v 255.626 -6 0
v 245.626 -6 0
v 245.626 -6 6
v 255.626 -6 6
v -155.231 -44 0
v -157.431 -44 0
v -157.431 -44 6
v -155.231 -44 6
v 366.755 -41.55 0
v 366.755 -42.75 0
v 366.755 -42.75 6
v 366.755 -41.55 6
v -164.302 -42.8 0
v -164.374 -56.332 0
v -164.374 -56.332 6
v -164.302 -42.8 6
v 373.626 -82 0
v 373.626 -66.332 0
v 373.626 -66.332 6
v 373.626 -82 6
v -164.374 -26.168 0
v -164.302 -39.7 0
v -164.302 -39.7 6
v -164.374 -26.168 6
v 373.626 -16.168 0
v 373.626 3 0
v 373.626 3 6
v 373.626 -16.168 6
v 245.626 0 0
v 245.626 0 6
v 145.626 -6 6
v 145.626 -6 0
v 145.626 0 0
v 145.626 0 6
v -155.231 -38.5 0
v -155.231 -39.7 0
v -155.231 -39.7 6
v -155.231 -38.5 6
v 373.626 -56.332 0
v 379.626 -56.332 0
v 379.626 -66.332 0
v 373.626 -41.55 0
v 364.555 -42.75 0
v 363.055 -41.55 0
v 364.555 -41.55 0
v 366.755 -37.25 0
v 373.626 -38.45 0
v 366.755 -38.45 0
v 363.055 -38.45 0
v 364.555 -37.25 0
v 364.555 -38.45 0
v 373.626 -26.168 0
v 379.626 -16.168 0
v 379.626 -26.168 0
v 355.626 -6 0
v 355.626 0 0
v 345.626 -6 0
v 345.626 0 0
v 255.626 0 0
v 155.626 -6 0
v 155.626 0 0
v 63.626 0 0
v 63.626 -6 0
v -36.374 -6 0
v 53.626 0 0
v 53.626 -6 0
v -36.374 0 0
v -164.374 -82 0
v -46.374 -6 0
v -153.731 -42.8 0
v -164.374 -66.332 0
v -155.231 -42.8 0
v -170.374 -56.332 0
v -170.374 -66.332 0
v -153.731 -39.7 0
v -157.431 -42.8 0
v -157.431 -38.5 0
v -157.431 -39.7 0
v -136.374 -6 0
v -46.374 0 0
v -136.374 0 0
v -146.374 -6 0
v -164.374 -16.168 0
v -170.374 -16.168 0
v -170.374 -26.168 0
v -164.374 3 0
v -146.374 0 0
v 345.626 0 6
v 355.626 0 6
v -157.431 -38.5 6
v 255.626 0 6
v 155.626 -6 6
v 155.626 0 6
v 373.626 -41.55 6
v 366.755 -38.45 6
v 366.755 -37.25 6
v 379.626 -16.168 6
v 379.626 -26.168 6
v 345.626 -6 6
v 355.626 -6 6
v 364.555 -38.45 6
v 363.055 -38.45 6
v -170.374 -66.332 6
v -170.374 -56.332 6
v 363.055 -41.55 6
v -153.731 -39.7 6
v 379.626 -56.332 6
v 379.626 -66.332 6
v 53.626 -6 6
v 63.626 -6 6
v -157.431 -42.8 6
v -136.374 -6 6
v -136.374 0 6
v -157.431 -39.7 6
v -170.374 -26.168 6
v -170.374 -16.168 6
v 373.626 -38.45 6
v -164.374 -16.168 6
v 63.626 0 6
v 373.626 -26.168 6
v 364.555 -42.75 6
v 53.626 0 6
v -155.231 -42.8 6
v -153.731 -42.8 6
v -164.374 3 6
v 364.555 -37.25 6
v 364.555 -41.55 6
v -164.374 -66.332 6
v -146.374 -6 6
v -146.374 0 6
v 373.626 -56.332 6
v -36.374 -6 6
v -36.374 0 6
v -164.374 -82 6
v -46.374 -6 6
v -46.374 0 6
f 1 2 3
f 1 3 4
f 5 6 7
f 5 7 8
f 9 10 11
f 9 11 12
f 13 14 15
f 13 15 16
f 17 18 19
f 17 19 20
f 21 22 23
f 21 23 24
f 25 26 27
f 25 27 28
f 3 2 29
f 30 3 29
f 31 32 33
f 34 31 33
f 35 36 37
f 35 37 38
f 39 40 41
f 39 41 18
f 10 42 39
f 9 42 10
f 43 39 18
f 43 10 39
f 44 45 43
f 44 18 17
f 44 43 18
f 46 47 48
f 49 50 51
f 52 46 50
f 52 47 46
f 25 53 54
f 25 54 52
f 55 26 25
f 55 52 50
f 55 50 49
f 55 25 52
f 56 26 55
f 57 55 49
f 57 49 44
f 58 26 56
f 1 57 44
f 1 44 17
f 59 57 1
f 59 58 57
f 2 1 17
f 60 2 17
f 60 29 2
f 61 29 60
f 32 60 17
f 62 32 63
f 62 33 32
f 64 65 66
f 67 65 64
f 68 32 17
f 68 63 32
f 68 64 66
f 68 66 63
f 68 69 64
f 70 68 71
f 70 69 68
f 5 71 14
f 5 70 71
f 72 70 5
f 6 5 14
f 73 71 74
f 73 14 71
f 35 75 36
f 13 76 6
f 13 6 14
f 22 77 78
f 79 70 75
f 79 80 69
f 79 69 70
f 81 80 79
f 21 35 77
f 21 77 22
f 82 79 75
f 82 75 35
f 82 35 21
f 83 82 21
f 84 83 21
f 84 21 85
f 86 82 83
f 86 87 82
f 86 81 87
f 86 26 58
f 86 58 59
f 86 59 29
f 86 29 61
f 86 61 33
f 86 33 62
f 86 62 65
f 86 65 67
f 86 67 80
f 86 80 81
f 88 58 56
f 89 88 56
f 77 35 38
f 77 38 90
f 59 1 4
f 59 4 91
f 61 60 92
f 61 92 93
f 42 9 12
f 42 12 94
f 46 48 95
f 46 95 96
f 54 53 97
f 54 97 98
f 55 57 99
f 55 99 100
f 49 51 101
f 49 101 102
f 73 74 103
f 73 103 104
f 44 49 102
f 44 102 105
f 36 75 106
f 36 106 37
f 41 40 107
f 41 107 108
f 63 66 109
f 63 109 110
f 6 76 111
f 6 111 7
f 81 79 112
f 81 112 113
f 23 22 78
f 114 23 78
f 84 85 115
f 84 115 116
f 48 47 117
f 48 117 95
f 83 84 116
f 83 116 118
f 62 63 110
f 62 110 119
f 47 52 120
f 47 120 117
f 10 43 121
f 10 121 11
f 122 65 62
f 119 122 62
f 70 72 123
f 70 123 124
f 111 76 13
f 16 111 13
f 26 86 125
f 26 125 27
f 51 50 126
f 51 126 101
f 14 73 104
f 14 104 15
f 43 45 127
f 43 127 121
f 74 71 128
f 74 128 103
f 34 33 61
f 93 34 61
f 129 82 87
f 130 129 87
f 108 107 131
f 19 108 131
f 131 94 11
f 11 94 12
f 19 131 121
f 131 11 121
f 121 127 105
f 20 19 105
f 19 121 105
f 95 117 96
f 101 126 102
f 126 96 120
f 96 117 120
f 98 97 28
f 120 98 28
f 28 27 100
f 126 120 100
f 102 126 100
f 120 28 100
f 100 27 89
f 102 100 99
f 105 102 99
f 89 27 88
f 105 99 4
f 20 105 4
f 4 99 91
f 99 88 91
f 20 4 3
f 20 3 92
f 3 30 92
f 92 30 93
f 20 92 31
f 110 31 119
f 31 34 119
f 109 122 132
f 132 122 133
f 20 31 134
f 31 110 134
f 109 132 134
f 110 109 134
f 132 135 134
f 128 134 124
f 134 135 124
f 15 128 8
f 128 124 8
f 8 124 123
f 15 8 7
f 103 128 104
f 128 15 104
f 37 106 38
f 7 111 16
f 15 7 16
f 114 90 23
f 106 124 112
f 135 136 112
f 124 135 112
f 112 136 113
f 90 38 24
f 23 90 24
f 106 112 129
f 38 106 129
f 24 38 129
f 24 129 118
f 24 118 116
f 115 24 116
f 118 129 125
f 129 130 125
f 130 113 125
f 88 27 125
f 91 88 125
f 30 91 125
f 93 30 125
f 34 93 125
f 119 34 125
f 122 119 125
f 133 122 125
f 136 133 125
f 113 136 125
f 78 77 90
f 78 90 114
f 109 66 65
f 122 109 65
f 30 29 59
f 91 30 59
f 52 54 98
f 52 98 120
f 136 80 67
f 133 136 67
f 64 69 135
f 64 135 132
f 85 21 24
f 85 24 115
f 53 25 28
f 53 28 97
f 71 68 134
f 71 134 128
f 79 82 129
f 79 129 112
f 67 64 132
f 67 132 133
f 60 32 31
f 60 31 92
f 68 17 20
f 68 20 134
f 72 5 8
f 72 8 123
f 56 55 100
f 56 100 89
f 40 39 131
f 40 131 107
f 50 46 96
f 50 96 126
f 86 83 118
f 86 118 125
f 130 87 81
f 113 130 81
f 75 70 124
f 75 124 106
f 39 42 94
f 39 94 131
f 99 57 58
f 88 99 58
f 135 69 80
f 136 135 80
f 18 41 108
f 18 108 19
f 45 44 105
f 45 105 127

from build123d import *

# Parameters (mm, degrees)
SKETCH_1_W      = 10
SKETCH_1_H      = 6
EXTRUDE_1_DEPTH = 6


with BuildPart() as part:
    # Эскиз1 → Бобышка-Вытянуть1 (new body)
    with BuildSketch(Plane.XY):
        Polygon((-164.373633731, 3), (373.626366269, 3), (373.626366269, -16.168156269), (379.626366269, -16.168156269), (379.626366269, -26.168156269), (373.626366269, -26.168156269), (373.626366269, -38.45), (366.754885836, -38.45), (366.754885836, -37.25), (364.554885836, -37.25), (364.554885836, -38.45), (363.054885836, -38.45), (363.054885836, -41.55), (364.554885836, -41.55), (364.554885836, -42.75), (366.754885836, -42.75), (366.754885836, -41.55), (373.626366269, -41.55), (373.626366269, -56.331843731), (379.626366269, -56.331843731), (379.626366269, -66.331843731), (373.626366269, -66.331843731), (373.626366269, -82), (-164.373633731, -82), (-164.373633731, -66.331843731), (-170.373633731, -66.331843731), (-170.373633731, -56.331843731), (-164.373633731, -56.331843731), (-164.302153297, -42.8), (-164.230672864, -42.8), (-157.430672864, -42.8), (-157.430672864, -44), (-155.230672864, -44), (-155.230672864, -42.8), (-153.730672864, -42.8), (-153.730672864, -39.7), (-155.230672864, -39.7), (-155.230672864, -38.5), (-157.430672864, -38.5), (-157.430672864, -39.7), (-164.230672864, -39.7), (-164.302153297, -39.7), (-164.373633731, -26.168156269), (-170.373633731, -26.168156269), (-170.373633731, -16.168156269), (-164.373633731, -16.168156269), align=None)
        with Locations((-141.373633731, -3)):
            Rectangle(SKETCH_1_W, SKETCH_1_H, mode=Mode.SUBTRACT)
        with Locations((-41.373633731, -3)):
            Rectangle(SKETCH_1_W, SKETCH_1_H, mode=Mode.SUBTRACT)
        with Locations((58.626366269, -3)):
            Rectangle(SKETCH_1_W, SKETCH_1_H, mode=Mode.SUBTRACT)
        with Locations((150.626366269, -3)):
            Rectangle(SKETCH_1_W, SKETCH_1_H, mode=Mode.SUBTRACT)
        with Locations((250.626366269, -3)):
            Rectangle(SKETCH_1_W, SKETCH_1_H, mode=Mode.SUBTRACT)
        with Locations((350.626366269, -3)):
            Rectangle(SKETCH_1_W, SKETCH_1_H, mode=Mode.SUBTRACT)
    extrude(amount=EXTRUDE_1_DEPTH)


solid = part.part
